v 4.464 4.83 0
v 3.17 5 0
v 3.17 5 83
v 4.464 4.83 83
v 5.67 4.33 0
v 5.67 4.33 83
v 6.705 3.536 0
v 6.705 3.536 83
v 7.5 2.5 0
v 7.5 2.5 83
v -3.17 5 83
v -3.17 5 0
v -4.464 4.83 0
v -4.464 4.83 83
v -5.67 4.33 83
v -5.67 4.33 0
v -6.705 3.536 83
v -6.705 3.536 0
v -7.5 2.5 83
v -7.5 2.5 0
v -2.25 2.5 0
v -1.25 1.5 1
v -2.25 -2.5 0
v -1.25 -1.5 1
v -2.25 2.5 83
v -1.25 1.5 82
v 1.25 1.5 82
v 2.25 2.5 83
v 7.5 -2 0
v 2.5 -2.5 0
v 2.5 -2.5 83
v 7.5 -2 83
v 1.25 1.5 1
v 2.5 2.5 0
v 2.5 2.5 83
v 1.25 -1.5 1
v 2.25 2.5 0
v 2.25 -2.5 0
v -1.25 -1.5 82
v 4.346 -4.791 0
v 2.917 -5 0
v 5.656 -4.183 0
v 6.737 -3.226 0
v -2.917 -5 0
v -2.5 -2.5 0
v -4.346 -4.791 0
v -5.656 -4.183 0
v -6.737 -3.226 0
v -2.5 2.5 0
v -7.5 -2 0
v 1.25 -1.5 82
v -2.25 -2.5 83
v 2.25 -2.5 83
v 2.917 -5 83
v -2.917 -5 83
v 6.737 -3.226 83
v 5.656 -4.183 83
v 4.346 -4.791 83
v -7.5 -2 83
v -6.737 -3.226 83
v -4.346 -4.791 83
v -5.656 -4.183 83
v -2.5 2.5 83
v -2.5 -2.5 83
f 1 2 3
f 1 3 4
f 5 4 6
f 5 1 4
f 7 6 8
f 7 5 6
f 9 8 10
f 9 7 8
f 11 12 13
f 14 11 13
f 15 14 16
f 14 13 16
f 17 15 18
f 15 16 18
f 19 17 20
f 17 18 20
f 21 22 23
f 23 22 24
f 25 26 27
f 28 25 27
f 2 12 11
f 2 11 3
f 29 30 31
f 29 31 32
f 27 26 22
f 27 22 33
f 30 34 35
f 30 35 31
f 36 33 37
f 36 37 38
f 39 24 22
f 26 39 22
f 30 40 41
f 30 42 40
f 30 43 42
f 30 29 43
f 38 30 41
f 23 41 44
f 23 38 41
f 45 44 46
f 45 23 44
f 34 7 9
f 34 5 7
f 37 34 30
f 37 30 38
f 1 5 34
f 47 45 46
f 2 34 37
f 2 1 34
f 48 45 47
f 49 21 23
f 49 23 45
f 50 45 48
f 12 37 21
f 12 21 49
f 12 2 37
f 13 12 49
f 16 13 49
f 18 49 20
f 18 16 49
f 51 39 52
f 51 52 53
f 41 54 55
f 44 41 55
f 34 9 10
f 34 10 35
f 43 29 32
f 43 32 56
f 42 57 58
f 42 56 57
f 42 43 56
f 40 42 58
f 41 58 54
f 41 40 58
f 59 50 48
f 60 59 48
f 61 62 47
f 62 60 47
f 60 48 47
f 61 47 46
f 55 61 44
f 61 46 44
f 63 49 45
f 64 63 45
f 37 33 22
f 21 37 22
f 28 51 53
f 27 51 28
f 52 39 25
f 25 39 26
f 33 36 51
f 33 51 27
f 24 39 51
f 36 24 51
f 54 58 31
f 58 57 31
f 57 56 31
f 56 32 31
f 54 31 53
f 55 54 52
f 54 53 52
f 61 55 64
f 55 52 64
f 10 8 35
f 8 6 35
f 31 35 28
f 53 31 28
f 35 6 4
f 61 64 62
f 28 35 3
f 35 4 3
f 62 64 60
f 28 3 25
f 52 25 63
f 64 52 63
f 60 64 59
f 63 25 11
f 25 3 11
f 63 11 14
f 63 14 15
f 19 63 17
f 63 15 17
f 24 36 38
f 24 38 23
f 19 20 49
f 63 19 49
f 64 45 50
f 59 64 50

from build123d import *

# Parameters (mm, degrees)
F1_DEPTH    = 83
F2_T1_DEPTH = 104.6506350946
F2_T3_DEPTH = 105.9128784748
F4_W        = 2.5
F4_H        = 3
F5_DEPTH    = 83.001
F6_SIZE     = 1


# Not quite as in the source:
# - a fillet or chamfer that OpenCascade refuses, or shapes differently, is made with other operations: its cross-section is extruded or revolved along the edge and cut away or added


with BuildPart() as f1:
    # F0 (on Top) → F1 (new body)
    with BuildSketch(Plane.XY):
        Polygon((0, -5), (0, 5), (-7.5, 5), (-7.5, 2.5), (-2.5, 2.5), (-2.5, -2.5), (-7.5, -2.5), (-7.5, -5), align=None)
        Polygon((-7.5, -2), (-7.5, -2.5), (-2.5, -2.5), align=None)
    extrude(amount=F1_DEPTH)

    # F2: fillet of radius 5 on 2 edges, made by hand

    # F2_s2 → F2_t1 (cut)
    with BuildSketch(Plane.XY.offset(-10.8253175473)):
        with BuildLine():
            ThreePointArc((-3.1698729811, 5), (-5.6698729811, 4.3301270189), (-7.5, 2.5))
            Line((-7.5, 2.5), (-7.5, 5))
            Line((-7.5, 5), (-3.1698729811, 5))
        make_face()
    extrude(amount=F2_T1_DEPTH, mode=Mode.SUBTRACT)

    # F2_s4 → F2_t3 (cut)
    with BuildSketch(Plane.XY.offset(-11.4564392374)):
        with BuildLine():
            ThreePointArc((-7.5, -2), (-5.6560370926, -4.1833001327), (-2.917424305, -5))
            Line((-2.917424305, -5), (-7.5, -5))
            Line((-7.5, -5), (-7.5, -2))
        make_face()
    extrude(amount=F2_T3_DEPTH, mode=Mode.SUBTRACT)

    # F3: F1 across face


with BuildPart() as f1_1:
    add(f1.part)
    add(f1.part.mirror(Plane(origin=(0, 0, 41.5), x_dir=(0, 1, 0), z_dir=(1, 0, 0))))

    # F4 (on face) → F5 (cut, through all)
    with BuildSketch(Plane.XY.offset(83)):
        Rectangle(F4_W, F4_H)
    extrude(amount=-F5_DEPTH, mode=Mode.SUBTRACT)

    # F6
    f6_edges = [f1_1.edges().sort_by_distance(p)[0] for p in [
        (1.25, 0, 83),
        (0, 1.5, 83),
        (-1.25, 0, 83),
        (0, -1.5, 83),
        (1.25, 0, 0),
        (0, -1.5, 0),
        (-1.25, 0, 0),
        (0, 1.5, 0),
    ]]
    chamfer(f6_edges, length=F6_SIZE)


solid = f1_1.part
